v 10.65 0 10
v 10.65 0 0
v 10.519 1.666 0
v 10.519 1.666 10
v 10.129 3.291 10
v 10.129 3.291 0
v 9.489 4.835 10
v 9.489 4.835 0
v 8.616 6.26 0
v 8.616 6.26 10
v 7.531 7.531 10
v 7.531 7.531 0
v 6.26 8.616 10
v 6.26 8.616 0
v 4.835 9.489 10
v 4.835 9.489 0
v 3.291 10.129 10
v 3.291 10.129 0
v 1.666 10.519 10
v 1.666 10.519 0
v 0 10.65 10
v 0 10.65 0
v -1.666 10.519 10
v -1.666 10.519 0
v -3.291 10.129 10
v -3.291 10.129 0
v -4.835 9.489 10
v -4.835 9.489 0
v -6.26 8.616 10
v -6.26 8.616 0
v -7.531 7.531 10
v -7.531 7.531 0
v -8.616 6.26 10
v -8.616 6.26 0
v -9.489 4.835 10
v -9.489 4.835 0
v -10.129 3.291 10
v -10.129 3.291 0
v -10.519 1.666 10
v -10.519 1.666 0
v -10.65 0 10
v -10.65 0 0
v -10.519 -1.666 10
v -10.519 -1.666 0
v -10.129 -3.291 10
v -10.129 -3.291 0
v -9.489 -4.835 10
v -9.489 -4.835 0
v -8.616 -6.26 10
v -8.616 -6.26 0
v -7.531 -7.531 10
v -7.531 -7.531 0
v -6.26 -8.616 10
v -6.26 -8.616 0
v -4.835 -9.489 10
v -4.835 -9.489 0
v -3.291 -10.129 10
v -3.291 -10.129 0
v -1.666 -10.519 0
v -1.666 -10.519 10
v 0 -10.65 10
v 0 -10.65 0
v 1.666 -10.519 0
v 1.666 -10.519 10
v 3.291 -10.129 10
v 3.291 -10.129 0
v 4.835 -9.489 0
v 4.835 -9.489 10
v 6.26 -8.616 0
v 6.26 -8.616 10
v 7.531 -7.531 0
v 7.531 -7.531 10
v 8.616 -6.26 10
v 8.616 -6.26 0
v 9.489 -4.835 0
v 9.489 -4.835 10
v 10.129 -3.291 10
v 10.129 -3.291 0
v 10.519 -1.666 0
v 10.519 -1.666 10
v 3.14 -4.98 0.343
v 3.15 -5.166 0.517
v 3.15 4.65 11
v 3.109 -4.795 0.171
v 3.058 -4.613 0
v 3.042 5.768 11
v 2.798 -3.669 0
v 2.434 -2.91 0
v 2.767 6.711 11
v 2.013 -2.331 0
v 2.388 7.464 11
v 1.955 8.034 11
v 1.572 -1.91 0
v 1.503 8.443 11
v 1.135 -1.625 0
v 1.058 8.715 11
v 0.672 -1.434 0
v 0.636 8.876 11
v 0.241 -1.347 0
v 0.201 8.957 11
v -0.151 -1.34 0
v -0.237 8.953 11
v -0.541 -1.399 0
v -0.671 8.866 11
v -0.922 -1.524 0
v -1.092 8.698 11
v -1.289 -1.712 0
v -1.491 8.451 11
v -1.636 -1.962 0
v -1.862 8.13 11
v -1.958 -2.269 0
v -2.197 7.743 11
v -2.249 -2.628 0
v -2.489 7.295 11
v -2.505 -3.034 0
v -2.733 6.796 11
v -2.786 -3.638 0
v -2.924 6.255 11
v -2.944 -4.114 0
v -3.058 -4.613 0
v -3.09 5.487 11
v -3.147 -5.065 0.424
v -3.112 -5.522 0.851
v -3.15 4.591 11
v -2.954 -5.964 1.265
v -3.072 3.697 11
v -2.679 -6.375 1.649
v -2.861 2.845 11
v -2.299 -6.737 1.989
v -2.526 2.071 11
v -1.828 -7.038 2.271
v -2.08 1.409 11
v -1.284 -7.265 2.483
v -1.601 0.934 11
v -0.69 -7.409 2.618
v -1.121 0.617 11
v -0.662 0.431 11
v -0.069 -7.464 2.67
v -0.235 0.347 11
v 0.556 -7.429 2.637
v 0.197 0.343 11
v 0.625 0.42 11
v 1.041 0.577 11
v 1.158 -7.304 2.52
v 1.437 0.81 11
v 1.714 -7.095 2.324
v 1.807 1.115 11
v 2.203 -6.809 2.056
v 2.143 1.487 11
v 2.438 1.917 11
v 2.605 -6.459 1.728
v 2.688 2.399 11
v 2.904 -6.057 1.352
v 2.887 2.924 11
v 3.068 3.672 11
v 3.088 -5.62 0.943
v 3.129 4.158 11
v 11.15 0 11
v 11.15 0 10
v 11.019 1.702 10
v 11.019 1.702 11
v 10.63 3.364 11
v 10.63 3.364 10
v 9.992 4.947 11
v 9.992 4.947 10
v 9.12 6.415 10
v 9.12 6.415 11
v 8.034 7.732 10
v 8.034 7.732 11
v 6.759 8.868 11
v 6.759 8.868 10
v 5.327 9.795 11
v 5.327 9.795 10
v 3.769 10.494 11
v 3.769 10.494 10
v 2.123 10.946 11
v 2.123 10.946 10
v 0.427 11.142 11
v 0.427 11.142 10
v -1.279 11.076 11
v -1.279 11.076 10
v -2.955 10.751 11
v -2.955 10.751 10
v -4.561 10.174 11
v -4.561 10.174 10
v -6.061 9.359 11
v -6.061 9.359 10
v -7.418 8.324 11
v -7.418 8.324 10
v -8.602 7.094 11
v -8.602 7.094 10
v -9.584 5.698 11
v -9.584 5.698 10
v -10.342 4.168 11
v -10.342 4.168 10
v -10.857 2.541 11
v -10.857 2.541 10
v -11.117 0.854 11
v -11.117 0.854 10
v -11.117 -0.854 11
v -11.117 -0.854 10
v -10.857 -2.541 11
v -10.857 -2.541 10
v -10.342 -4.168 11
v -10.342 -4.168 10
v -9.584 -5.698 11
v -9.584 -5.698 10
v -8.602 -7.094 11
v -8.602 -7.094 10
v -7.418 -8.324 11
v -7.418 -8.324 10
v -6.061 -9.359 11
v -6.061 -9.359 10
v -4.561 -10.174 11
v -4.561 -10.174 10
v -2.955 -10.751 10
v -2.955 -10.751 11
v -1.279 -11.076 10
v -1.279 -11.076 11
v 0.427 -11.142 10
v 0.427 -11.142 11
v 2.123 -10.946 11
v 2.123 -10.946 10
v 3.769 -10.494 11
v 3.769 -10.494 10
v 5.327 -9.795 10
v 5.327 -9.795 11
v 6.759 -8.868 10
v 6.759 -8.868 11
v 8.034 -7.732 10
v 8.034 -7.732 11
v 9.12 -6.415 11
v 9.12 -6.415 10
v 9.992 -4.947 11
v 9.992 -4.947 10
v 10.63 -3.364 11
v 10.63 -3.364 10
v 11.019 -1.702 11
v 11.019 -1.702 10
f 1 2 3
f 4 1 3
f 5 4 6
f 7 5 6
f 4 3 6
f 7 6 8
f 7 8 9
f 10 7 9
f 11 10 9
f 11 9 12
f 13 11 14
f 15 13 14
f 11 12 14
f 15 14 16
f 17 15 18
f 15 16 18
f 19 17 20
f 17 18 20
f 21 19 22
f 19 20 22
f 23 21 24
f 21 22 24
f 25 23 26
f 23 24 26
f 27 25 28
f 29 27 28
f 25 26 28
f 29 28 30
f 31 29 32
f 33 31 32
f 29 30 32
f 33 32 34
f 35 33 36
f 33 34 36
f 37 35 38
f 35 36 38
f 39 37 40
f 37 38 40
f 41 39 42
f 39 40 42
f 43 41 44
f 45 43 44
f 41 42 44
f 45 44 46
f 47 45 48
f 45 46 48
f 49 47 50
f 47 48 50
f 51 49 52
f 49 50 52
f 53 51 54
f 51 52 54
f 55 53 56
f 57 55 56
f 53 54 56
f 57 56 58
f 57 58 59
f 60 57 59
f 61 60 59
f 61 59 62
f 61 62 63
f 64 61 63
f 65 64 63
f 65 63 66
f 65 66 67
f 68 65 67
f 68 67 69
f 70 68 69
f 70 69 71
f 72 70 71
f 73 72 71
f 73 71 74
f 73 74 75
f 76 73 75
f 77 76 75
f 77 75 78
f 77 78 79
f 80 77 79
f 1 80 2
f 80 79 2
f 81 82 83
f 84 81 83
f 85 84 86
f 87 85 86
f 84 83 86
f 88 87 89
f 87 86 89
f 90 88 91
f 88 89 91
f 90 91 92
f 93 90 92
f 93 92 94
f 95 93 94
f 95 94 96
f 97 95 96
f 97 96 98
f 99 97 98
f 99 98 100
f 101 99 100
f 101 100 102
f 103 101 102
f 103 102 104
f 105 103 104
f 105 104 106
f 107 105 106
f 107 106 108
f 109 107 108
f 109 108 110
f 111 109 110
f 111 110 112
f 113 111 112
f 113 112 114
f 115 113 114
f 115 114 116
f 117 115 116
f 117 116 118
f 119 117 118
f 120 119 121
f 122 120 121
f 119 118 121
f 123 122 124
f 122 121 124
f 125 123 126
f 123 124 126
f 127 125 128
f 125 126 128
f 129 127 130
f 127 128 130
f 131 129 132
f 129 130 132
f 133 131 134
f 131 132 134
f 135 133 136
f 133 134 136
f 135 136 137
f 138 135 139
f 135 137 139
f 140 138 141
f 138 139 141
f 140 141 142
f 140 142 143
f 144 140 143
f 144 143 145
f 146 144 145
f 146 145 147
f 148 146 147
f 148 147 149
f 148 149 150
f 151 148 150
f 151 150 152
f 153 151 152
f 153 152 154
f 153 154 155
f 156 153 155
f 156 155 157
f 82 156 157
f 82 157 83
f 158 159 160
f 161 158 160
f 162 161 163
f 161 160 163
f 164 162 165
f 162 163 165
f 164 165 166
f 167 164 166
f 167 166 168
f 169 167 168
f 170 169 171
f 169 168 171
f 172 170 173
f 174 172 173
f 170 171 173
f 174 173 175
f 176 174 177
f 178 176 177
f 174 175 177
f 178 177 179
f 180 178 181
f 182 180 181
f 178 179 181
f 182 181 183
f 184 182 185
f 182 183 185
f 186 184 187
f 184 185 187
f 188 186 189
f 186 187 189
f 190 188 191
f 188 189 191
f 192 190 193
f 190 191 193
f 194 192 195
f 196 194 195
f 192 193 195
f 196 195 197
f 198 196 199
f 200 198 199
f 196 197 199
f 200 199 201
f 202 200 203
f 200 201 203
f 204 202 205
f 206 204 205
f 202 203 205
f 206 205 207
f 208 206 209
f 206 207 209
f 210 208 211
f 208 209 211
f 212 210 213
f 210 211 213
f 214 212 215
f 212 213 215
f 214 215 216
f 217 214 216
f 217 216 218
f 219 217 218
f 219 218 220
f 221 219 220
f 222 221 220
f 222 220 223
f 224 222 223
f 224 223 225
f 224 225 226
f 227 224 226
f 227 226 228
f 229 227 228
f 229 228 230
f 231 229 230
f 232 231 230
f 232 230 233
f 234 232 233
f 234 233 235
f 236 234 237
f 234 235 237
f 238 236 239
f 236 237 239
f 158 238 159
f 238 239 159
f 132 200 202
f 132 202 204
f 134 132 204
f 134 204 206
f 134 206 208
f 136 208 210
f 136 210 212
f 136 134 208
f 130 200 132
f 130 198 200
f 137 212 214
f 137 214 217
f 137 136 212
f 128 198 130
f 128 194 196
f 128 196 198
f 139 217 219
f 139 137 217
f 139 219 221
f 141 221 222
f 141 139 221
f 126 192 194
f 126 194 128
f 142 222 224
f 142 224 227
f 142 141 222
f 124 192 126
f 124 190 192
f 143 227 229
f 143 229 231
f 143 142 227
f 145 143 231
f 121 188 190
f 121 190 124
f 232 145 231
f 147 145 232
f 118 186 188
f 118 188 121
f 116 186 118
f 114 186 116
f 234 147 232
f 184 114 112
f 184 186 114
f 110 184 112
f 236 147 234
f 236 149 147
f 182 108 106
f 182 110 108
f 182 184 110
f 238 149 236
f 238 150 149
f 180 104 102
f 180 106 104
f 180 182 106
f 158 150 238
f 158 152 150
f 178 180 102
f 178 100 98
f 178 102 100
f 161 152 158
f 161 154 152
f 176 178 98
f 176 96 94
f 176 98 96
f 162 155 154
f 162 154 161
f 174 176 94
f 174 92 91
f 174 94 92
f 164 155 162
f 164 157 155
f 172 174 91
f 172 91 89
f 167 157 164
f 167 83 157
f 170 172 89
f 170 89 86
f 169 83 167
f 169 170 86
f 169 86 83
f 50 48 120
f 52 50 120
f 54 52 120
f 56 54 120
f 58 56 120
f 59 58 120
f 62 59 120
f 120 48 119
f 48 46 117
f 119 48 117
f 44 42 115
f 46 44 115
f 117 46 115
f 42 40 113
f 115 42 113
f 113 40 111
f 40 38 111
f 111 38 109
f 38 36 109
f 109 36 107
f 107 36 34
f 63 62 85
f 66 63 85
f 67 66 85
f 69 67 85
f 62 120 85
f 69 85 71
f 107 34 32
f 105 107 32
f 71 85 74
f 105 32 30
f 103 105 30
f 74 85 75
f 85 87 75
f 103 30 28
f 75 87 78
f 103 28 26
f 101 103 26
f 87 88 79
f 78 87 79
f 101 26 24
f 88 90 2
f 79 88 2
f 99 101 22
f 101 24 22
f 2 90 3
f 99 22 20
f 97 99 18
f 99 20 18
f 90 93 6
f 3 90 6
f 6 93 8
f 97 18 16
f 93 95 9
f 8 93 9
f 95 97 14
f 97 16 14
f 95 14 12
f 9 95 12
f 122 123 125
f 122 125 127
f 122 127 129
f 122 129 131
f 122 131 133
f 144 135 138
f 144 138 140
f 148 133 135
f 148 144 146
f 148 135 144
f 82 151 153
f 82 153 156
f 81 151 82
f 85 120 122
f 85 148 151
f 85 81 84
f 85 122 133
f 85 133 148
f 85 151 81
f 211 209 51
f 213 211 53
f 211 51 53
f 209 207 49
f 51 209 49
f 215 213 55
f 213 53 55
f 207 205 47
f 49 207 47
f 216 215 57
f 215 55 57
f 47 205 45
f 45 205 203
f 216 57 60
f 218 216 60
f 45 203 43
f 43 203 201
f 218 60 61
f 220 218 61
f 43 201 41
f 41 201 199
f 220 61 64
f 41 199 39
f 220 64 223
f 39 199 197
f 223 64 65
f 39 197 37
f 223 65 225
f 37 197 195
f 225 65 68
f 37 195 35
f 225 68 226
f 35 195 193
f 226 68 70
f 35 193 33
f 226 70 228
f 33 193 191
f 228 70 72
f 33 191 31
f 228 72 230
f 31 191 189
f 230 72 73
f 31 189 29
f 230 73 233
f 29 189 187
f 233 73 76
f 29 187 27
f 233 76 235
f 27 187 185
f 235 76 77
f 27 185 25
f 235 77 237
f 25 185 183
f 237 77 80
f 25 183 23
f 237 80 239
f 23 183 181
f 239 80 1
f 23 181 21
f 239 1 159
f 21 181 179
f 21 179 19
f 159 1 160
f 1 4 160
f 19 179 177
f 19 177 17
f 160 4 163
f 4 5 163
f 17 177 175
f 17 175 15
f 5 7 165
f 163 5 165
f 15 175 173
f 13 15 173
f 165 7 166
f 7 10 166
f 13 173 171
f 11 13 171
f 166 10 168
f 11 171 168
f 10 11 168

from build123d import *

# Parameters (mm, degrees)
F0_R     = 10.65
F1_DEPTH = 10
F2_R     = 11.15
F2_R_2   = 10.65
F3_DEPTH = 1
F7_R     = 3.15
F8_DEPTH = 27.57


with BuildPart() as f1:
    # F0 (on Top) → F1 (new body)
    with BuildSketch(Plane.XY):
        Circle(F0_R)
    extrude(amount=F1_DEPTH)

    # F2 (on face) → F3 (join)
    with BuildSketch(Plane.XY.offset(10)):
        Circle(F2_R)
        Circle(F2_R_2, mode=Mode.SUBTRACT)
        Circle(F2_R_2)
    extrude(amount=F3_DEPTH)

    # F7 (on face) → F8 (cut)
    with BuildSketch(Plane(origin=(0, 16.688987, 17.823191), x_dir=(1, 0, 0), z_dir=(0, 0.6835, 0.729951))):
        with Locations((0, -4.124223)):
            Circle(F7_R)
    extrude(amount=-F8_DEPTH, mode=Mode.SUBTRACT)


solid = f1.part
